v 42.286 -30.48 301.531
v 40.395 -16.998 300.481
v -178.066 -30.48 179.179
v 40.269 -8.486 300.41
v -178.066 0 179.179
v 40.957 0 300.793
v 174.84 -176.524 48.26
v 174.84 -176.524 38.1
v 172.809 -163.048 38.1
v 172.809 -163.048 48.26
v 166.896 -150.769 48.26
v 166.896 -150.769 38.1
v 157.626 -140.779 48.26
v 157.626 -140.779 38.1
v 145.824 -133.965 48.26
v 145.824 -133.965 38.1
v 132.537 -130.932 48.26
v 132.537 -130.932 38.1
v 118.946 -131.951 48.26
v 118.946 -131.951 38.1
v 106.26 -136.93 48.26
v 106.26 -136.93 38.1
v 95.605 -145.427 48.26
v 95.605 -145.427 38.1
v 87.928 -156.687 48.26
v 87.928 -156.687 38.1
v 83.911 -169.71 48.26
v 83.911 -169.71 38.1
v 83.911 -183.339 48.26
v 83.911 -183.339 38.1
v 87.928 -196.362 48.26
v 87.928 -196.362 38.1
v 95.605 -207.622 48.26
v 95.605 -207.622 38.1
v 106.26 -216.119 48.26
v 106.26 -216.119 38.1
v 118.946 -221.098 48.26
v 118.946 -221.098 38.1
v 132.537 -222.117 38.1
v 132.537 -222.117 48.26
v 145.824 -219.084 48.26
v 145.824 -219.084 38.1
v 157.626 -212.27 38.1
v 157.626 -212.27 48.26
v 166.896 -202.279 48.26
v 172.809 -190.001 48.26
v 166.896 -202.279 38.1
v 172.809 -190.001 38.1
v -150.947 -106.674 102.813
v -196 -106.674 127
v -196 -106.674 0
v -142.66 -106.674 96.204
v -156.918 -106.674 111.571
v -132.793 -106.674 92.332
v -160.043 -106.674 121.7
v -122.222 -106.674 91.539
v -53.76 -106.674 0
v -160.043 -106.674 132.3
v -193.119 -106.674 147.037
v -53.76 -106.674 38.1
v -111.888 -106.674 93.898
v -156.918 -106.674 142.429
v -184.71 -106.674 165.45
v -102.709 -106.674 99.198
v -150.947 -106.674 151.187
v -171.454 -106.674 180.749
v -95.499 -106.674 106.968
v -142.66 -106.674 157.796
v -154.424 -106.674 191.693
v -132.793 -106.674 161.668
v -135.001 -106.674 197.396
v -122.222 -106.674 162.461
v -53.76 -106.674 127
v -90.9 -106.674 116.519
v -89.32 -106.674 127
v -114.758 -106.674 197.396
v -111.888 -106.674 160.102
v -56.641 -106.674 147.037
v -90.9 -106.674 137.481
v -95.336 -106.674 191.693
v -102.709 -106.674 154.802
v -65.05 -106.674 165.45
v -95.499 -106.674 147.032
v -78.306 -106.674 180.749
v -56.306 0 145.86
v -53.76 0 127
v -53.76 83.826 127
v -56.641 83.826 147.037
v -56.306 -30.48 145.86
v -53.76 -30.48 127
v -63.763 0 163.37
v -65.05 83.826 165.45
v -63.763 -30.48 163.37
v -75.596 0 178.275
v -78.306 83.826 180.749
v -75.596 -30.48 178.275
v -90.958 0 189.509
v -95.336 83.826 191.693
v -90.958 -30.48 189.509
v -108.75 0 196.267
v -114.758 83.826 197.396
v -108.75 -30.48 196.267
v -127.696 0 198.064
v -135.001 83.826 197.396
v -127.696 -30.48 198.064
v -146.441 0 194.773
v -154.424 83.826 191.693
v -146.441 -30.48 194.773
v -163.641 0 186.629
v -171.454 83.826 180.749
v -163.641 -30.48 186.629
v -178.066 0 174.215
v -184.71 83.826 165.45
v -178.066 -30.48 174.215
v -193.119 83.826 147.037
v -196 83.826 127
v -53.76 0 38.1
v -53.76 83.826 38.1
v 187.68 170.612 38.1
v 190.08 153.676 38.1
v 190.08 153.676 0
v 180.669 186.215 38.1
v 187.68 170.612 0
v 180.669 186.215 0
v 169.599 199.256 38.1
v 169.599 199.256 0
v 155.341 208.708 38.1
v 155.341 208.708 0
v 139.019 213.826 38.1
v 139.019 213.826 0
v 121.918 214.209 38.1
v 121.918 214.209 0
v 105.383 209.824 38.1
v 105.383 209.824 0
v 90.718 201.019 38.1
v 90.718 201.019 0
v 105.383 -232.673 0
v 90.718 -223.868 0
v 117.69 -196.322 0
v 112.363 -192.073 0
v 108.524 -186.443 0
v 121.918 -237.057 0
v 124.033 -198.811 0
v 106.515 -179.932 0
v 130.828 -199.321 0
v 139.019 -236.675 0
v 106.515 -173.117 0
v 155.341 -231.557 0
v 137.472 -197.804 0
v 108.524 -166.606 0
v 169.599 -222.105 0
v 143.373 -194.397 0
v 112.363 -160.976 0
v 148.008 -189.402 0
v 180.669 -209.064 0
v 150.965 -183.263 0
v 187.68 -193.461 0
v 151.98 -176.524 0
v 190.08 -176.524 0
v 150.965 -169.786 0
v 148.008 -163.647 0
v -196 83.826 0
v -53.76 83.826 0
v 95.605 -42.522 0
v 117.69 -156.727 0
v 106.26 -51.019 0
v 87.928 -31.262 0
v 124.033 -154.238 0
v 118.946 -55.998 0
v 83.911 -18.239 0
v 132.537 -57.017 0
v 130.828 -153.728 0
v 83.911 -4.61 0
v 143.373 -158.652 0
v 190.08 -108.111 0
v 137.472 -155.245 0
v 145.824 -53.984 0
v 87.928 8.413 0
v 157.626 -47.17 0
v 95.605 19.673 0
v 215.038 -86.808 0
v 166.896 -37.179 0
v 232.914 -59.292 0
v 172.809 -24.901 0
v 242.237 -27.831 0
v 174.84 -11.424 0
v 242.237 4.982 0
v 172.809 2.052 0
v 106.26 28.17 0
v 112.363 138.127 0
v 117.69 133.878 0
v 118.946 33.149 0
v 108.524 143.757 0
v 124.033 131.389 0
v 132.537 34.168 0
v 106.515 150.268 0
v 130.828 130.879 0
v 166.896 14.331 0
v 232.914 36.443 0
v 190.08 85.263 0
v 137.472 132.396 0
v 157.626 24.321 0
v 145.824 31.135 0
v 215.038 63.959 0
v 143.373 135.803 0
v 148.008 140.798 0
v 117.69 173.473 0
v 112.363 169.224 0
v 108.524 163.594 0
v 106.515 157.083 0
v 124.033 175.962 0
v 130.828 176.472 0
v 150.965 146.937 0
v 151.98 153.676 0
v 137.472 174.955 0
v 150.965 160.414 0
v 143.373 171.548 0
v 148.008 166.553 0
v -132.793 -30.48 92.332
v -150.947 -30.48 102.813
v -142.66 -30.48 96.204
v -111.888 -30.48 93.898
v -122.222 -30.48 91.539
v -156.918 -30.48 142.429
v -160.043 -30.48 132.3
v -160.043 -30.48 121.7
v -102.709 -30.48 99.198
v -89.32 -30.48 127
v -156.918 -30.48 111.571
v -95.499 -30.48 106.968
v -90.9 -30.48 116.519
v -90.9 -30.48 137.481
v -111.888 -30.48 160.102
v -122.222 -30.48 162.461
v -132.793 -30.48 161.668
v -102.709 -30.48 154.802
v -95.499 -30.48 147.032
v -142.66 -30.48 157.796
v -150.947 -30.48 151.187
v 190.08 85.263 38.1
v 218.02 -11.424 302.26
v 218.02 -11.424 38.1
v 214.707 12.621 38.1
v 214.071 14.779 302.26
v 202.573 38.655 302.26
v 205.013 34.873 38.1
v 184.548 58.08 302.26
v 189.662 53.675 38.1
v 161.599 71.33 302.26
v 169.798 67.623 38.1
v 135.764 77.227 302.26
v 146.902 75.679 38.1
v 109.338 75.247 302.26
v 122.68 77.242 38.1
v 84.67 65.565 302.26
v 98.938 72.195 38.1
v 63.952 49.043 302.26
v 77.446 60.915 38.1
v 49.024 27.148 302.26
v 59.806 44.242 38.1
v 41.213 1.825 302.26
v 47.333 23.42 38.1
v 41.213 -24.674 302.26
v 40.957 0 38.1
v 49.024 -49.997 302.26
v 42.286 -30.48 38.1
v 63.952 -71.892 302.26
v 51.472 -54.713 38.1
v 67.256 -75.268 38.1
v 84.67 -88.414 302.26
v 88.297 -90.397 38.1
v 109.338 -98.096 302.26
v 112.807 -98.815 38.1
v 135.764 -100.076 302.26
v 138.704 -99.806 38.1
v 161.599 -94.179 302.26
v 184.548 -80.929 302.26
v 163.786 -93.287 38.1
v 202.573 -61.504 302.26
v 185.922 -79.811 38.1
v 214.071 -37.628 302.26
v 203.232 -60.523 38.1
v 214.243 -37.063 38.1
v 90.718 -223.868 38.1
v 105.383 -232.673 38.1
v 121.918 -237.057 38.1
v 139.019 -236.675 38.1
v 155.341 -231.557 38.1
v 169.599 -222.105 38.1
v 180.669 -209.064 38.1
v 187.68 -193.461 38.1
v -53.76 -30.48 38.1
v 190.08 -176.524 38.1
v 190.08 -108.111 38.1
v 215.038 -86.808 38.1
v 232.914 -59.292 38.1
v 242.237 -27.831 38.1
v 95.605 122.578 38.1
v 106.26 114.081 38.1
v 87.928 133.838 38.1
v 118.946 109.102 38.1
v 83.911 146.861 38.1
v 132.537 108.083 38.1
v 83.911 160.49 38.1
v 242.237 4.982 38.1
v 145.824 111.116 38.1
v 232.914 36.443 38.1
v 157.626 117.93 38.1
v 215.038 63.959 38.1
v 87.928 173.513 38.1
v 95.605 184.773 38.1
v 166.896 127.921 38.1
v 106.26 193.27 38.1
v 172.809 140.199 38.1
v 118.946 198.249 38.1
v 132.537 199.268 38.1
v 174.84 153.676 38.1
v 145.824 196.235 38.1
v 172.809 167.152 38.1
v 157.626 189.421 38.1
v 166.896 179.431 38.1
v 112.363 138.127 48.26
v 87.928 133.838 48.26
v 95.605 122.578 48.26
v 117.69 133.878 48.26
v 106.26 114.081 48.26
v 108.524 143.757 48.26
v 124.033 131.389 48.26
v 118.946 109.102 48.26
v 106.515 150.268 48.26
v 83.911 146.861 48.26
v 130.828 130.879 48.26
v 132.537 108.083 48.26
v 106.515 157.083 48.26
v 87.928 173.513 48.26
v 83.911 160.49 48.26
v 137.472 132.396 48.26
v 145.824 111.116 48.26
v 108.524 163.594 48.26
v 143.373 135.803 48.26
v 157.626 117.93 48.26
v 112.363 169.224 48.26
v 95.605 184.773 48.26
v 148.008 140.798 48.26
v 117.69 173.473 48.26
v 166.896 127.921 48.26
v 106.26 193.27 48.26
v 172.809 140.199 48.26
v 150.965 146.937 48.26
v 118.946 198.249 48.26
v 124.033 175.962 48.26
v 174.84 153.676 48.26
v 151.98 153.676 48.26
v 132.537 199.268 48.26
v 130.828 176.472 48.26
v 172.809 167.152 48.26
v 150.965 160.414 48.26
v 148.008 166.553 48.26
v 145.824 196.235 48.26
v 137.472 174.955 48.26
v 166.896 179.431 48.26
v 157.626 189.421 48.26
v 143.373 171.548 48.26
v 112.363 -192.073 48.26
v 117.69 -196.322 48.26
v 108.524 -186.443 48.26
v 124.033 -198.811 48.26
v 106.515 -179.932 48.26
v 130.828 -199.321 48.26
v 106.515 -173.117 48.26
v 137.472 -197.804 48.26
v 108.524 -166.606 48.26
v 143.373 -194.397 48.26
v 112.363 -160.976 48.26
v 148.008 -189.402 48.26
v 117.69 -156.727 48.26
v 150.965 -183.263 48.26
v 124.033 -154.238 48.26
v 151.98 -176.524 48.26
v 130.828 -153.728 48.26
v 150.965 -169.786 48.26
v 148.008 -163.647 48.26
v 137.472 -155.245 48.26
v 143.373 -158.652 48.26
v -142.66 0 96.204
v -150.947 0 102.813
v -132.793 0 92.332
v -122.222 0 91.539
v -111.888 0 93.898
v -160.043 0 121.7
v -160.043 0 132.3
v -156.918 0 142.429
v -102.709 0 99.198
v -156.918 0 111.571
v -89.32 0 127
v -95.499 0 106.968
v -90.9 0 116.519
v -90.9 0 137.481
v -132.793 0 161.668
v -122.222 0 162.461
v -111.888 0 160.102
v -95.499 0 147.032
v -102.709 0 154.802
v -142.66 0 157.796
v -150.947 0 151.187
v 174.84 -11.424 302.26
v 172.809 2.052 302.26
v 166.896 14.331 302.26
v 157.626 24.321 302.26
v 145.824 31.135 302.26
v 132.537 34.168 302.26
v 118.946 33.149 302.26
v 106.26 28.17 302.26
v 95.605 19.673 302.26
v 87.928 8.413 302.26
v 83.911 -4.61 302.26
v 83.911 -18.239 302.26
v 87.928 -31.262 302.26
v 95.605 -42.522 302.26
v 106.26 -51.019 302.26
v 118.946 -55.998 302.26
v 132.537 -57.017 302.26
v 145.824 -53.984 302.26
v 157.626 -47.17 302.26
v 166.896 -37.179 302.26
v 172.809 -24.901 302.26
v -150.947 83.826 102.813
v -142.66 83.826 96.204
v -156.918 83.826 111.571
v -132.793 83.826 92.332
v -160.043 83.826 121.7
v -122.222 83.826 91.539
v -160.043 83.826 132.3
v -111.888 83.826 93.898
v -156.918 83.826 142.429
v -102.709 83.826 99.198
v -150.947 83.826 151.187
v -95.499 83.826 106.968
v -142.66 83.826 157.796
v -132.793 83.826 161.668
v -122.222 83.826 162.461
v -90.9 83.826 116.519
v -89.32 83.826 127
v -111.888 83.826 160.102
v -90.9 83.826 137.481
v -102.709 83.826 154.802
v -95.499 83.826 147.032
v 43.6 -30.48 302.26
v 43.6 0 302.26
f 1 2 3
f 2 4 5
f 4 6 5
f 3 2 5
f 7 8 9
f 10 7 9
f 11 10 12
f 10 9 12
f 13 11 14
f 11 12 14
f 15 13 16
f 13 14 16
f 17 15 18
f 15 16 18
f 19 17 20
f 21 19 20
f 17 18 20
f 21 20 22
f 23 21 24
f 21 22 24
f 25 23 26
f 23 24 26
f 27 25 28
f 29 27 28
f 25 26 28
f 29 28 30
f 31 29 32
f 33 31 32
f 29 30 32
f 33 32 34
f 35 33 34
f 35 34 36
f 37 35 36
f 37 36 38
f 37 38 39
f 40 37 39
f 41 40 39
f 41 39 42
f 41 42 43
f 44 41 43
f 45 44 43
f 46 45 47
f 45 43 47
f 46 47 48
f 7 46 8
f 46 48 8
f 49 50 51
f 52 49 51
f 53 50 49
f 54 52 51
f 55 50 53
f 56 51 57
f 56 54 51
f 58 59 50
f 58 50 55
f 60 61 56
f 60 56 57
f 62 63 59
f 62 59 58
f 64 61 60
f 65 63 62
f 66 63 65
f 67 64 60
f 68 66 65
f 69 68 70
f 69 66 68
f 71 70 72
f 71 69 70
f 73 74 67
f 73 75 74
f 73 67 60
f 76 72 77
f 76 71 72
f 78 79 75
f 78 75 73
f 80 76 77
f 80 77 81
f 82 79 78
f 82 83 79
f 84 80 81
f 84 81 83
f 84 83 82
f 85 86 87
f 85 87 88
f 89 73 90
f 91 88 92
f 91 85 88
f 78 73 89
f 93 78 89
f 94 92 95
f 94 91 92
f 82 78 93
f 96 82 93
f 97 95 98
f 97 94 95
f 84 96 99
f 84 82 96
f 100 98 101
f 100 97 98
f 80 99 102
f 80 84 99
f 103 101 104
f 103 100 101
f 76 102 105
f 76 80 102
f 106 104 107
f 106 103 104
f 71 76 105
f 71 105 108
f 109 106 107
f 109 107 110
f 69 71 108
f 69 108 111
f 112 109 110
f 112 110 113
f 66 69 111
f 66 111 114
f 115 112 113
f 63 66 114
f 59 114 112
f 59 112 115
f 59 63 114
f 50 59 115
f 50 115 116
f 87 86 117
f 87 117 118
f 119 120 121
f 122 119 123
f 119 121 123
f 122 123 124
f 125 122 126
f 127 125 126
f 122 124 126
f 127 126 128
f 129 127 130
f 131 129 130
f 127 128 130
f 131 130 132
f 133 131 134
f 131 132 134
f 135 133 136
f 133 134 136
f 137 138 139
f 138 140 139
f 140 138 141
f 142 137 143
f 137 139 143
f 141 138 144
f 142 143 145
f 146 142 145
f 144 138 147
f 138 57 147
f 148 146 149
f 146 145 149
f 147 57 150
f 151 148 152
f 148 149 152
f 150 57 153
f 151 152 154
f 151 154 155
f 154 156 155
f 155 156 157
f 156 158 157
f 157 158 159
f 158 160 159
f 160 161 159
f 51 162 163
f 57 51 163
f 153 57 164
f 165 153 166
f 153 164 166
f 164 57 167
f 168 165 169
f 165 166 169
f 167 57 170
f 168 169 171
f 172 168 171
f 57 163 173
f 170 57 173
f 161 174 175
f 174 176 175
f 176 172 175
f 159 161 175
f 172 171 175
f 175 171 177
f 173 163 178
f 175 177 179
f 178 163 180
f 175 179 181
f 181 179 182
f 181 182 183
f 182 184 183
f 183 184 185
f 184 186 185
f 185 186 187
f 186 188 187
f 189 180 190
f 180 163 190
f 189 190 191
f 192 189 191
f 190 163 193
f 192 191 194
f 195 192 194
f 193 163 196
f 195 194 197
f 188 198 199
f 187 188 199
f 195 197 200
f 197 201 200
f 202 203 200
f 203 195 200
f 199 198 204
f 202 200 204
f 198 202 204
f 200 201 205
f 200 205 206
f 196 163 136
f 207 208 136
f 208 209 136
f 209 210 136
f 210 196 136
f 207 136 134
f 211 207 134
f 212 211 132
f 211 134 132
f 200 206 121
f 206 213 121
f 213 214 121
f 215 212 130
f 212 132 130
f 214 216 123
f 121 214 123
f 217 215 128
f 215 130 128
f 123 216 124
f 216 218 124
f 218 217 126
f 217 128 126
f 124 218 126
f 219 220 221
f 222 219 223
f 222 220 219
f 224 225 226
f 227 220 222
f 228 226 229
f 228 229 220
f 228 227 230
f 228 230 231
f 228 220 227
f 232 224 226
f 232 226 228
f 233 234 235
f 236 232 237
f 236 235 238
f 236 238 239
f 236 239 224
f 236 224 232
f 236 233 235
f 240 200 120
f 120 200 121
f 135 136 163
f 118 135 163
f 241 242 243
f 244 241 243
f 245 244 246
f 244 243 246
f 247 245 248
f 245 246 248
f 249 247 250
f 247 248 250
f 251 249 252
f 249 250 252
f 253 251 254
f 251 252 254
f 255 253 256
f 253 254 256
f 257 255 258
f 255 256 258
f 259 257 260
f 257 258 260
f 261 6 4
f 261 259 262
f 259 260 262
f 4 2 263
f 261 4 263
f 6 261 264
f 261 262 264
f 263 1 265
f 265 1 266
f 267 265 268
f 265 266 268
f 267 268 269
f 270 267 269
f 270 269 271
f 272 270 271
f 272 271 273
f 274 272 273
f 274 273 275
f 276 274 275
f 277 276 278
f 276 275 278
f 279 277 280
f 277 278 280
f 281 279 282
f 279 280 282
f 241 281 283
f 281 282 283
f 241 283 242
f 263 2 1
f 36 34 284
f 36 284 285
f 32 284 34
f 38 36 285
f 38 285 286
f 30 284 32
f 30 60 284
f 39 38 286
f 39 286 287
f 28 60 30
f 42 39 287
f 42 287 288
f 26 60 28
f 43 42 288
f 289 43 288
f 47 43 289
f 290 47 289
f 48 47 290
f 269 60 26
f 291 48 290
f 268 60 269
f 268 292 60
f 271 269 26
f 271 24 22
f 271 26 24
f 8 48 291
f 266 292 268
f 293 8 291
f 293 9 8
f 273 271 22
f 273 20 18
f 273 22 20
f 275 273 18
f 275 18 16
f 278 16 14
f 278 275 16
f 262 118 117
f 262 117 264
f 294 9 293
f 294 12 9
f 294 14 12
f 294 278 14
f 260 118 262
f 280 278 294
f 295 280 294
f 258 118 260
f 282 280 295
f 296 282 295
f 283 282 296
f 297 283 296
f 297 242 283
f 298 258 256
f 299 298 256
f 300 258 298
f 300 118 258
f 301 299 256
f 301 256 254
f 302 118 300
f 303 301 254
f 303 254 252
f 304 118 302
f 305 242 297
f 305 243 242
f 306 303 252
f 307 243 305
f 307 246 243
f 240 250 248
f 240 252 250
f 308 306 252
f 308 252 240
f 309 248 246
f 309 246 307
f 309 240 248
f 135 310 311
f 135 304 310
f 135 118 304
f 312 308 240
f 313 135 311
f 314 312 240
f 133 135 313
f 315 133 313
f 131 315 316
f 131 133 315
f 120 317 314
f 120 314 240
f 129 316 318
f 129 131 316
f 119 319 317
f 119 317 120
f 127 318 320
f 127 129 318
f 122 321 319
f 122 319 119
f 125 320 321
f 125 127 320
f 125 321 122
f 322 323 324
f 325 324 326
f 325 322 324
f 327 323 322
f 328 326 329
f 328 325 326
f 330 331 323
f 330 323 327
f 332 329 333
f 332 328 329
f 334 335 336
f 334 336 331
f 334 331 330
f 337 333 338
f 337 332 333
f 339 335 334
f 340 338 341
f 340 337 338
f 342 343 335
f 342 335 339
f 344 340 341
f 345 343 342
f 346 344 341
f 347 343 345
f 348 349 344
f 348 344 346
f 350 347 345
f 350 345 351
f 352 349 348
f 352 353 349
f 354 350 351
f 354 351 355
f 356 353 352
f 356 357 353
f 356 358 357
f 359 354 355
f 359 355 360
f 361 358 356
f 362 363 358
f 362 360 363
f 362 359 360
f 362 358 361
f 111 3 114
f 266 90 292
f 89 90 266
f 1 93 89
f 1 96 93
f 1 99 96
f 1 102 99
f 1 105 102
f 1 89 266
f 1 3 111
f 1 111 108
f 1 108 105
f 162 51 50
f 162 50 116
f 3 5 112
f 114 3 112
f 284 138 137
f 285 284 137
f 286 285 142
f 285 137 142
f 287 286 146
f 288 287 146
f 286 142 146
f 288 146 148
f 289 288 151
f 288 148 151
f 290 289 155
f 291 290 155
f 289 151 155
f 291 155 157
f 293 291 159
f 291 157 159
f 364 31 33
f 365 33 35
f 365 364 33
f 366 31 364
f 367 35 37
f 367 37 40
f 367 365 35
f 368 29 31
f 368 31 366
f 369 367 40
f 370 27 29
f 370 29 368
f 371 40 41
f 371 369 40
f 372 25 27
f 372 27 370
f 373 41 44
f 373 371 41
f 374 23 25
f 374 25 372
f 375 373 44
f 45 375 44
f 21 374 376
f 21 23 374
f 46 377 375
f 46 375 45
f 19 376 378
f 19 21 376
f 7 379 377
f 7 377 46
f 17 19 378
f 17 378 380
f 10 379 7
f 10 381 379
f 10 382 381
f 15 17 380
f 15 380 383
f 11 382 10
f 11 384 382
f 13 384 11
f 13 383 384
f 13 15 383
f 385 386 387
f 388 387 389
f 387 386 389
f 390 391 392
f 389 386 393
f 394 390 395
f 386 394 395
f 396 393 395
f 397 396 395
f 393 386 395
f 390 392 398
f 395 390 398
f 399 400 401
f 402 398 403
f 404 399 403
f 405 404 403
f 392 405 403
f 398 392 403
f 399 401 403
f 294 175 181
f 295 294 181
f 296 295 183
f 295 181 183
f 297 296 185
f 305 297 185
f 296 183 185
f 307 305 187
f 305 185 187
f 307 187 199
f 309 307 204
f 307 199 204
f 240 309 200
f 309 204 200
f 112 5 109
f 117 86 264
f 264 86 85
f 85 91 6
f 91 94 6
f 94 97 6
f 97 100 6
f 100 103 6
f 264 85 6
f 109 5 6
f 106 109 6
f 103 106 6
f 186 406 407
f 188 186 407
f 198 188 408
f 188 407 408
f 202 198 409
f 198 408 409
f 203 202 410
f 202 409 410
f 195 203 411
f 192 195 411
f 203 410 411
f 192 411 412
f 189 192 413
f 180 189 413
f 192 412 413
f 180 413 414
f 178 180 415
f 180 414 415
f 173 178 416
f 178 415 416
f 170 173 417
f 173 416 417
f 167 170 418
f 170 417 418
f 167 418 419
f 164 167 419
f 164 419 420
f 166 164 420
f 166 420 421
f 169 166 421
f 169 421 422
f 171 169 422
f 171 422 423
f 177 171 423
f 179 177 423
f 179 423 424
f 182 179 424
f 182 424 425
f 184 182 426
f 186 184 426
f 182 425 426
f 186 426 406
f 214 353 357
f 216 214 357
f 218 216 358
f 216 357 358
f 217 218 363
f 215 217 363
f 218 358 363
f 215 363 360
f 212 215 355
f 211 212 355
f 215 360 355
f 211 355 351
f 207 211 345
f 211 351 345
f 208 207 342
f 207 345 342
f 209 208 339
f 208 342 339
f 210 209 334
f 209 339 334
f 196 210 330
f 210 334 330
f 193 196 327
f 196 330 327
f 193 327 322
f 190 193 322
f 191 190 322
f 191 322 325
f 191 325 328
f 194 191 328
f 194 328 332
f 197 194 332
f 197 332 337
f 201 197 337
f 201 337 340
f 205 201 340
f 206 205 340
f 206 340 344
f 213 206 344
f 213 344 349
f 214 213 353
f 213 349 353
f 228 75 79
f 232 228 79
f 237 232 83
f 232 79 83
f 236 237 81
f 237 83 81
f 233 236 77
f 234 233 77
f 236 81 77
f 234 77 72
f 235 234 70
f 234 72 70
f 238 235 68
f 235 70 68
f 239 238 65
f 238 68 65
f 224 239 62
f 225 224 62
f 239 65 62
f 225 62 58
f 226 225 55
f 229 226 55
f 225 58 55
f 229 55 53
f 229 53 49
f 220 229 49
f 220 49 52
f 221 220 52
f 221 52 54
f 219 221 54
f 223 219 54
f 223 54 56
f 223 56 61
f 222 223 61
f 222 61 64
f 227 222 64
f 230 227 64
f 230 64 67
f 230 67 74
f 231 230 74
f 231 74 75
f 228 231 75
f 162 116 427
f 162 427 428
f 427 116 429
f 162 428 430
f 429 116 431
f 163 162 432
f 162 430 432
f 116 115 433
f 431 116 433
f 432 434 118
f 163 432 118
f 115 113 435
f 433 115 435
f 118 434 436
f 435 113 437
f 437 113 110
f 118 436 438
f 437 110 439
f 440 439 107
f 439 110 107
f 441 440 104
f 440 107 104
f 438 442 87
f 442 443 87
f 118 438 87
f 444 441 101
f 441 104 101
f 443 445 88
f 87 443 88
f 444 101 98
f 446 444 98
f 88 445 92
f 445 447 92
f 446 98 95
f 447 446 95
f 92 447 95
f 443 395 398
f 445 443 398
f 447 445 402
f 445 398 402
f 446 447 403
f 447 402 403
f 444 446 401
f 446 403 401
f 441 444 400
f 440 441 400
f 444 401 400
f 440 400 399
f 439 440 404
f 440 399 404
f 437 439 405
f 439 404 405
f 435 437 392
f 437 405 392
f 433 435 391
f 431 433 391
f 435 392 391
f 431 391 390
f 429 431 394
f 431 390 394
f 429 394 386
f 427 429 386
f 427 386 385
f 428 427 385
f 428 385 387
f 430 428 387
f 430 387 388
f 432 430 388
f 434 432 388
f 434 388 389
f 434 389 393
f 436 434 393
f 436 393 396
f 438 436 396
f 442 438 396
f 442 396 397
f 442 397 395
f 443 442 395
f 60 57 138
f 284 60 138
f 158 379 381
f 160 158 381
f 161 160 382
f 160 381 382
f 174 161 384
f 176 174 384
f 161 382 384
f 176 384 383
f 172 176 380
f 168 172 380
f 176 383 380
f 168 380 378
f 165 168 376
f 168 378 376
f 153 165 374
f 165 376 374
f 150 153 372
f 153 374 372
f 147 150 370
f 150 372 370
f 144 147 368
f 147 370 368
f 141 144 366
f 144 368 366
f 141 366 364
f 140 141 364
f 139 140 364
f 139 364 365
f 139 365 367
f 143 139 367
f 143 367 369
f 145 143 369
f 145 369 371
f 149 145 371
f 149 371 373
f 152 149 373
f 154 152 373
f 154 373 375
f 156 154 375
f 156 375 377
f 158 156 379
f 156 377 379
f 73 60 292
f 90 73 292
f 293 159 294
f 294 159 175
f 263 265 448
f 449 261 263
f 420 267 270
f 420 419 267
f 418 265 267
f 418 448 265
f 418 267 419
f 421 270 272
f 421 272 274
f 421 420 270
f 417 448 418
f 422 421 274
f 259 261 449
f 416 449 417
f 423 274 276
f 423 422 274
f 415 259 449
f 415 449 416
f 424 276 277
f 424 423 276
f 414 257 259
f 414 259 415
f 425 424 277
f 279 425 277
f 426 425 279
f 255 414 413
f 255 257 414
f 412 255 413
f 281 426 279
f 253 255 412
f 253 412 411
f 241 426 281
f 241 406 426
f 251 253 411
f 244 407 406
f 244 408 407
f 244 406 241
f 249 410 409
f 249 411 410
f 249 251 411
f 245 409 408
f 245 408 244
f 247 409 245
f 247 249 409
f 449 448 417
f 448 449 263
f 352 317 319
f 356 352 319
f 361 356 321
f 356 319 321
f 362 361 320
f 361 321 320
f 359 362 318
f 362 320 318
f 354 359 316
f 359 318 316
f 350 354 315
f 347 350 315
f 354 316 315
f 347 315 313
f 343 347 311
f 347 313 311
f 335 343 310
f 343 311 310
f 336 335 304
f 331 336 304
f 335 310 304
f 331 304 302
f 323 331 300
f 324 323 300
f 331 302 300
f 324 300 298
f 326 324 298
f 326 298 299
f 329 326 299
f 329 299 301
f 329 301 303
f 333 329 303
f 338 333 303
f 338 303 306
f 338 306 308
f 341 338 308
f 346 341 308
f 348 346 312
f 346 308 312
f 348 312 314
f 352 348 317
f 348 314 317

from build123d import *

# Parameters (mm, degrees)
F1_DEPTH  = 38.1
F0_W      = 142.24
F0_H      = 190.5
F2_DEPTH  = 127
F4_DEPTH  = 190.5
F5_R      = 35.56
F6_DEPTH  = 190.5
F7_R      = 45.72
F8_DEPTH  = 10.16
F9_DEPTH  = 10.16
F10_R     = 22.86
F11_DEPTH = 48.26
F12_R     = 22.86
F13_DEPTH = 48.26
F14_R     = 88.9
F15_DEPTH = 264.16
F16_R     = 45.72
F17_DEPTH = 302.26
F19_DEPTH = 30.48


with BuildPart() as f1:
    # F0 (on Top) → F1 (new body)
    with BuildSketch(Plane.XY):
        with BuildLine():
            Line((90.7176998631, 201.0186984875), (-53.7598490381, 83.8255537926))
            Line((-53.7598490381, 83.8255537926), (-53.7598490381, -106.6744462074))
            Line((-53.7598490381, -106.6744462074), (90.7176998631, -223.8675909024))
            ThreePointArc((90.7176998631, -223.8675909024), (155.3414036114, -231.5568685554), (190.0801509619, -176.5244462074))
            Line((190.0801509619, -176.5244462074), (190.0801509619, -108.1114070656))
            ThreePointArc((190.0801509619, -108.1114070656), (243.4201509619, -11.4244462074), (190.0801509619, 85.2625146508))
            Line((190.0801509619, 85.2625146508), (190.0801509619, 153.6755537926))
            ThreePointArc((190.0801509619, 153.6755537926), (155.3414036114, 208.7079761406), (90.7176998631, 201.0186984875))
        make_face()
    extrude(amount=F1_DEPTH)

    # F0 (on Top) → F2 (join)
    with BuildSketch(Plane.XY):
        with Locations((-124.8798490381, -11.4244462074)):
            Rectangle(F0_W, F0_H)
    extrude(amount=F2_DEPTH)

    # F3 (on face) → F4 (join)
    with BuildSketch(Plane.XZ.offset(106.6744462074)):
        with BuildLine():
            Line((-195.9998490381, 127), (-53.7598490381, 127))
            ThreePointArc((-53.7598490381, 127), (-124.8798490381, 198.12), (-195.9998490381, 127))
        make_face()
    extrude(amount=-F4_DEPTH)

    # F5 (on face) → F6 (cut)
    with BuildSketch(Plane.XZ.offset(106.6744462074)):
        with Locations((-124.8798490381, 127)):
            Circle(F5_R)
    extrude(amount=-F6_DEPTH, mode=Mode.SUBTRACT)

    # F7 (on face) → F8 (join)
    with BuildSketch(Plane.XY.offset(38.1)):
        with Locations((129.1201509619, -176.5244462074)):
            Circle(F7_R)
    extrude(amount=F8_DEPTH)

    # F7 (on face) → F9 (join)
    with BuildSketch(Plane.XY.offset(38.1)):
        with Locations((129.1201509619, 153.6755537926)):
            Circle(F7_R)
        with Locations((129.1201509619, -176.5244462074)):
            Circle(F7_R)
    extrude(amount=F9_DEPTH)

    # F10 (on face) → F11 (cut)
    with BuildSketch(Plane.XY.offset(48.26)):
        with Locations((129.1201509619, 153.6755537926)):
            Circle(F10_R)
    extrude(amount=-F11_DEPTH, mode=Mode.SUBTRACT)

    # F12 (on face) → F13 (cut)
    with BuildSketch(Plane.XY.offset(48.26)):
        with Locations((129.1201509619, -176.5244462074)):
            Circle(F12_R)
    extrude(amount=-F13_DEPTH, mode=Mode.SUBTRACT)

    # F14 (on face) → F15 (join)
    with BuildSketch(Plane.XY.offset(38.1)):
        with Locations((129.1201509619, -11.4244462074)):
            Circle(F14_R)
    extrude(amount=F15_DEPTH)

    # F16 (on face) → F17 (cut)
    with BuildSketch(Plane.XY.offset(302.26)):
        with Locations((129.1201509619, -11.4244462074)):
            Circle(F16_R)
    extrude(amount=-F17_DEPTH, mode=Mode.SUBTRACT)

    # F18 (on Front) → F19 (join)
    with BuildSketch(Plane.XZ):
        Polygon((43.5996614397, 302.26), (-178.0664920807, 179.1791468859), (-178.0664920807, 0), (43.5996614397, 0), align=None)
    extrude(amount=F19_DEPTH)


solid = f1.part
